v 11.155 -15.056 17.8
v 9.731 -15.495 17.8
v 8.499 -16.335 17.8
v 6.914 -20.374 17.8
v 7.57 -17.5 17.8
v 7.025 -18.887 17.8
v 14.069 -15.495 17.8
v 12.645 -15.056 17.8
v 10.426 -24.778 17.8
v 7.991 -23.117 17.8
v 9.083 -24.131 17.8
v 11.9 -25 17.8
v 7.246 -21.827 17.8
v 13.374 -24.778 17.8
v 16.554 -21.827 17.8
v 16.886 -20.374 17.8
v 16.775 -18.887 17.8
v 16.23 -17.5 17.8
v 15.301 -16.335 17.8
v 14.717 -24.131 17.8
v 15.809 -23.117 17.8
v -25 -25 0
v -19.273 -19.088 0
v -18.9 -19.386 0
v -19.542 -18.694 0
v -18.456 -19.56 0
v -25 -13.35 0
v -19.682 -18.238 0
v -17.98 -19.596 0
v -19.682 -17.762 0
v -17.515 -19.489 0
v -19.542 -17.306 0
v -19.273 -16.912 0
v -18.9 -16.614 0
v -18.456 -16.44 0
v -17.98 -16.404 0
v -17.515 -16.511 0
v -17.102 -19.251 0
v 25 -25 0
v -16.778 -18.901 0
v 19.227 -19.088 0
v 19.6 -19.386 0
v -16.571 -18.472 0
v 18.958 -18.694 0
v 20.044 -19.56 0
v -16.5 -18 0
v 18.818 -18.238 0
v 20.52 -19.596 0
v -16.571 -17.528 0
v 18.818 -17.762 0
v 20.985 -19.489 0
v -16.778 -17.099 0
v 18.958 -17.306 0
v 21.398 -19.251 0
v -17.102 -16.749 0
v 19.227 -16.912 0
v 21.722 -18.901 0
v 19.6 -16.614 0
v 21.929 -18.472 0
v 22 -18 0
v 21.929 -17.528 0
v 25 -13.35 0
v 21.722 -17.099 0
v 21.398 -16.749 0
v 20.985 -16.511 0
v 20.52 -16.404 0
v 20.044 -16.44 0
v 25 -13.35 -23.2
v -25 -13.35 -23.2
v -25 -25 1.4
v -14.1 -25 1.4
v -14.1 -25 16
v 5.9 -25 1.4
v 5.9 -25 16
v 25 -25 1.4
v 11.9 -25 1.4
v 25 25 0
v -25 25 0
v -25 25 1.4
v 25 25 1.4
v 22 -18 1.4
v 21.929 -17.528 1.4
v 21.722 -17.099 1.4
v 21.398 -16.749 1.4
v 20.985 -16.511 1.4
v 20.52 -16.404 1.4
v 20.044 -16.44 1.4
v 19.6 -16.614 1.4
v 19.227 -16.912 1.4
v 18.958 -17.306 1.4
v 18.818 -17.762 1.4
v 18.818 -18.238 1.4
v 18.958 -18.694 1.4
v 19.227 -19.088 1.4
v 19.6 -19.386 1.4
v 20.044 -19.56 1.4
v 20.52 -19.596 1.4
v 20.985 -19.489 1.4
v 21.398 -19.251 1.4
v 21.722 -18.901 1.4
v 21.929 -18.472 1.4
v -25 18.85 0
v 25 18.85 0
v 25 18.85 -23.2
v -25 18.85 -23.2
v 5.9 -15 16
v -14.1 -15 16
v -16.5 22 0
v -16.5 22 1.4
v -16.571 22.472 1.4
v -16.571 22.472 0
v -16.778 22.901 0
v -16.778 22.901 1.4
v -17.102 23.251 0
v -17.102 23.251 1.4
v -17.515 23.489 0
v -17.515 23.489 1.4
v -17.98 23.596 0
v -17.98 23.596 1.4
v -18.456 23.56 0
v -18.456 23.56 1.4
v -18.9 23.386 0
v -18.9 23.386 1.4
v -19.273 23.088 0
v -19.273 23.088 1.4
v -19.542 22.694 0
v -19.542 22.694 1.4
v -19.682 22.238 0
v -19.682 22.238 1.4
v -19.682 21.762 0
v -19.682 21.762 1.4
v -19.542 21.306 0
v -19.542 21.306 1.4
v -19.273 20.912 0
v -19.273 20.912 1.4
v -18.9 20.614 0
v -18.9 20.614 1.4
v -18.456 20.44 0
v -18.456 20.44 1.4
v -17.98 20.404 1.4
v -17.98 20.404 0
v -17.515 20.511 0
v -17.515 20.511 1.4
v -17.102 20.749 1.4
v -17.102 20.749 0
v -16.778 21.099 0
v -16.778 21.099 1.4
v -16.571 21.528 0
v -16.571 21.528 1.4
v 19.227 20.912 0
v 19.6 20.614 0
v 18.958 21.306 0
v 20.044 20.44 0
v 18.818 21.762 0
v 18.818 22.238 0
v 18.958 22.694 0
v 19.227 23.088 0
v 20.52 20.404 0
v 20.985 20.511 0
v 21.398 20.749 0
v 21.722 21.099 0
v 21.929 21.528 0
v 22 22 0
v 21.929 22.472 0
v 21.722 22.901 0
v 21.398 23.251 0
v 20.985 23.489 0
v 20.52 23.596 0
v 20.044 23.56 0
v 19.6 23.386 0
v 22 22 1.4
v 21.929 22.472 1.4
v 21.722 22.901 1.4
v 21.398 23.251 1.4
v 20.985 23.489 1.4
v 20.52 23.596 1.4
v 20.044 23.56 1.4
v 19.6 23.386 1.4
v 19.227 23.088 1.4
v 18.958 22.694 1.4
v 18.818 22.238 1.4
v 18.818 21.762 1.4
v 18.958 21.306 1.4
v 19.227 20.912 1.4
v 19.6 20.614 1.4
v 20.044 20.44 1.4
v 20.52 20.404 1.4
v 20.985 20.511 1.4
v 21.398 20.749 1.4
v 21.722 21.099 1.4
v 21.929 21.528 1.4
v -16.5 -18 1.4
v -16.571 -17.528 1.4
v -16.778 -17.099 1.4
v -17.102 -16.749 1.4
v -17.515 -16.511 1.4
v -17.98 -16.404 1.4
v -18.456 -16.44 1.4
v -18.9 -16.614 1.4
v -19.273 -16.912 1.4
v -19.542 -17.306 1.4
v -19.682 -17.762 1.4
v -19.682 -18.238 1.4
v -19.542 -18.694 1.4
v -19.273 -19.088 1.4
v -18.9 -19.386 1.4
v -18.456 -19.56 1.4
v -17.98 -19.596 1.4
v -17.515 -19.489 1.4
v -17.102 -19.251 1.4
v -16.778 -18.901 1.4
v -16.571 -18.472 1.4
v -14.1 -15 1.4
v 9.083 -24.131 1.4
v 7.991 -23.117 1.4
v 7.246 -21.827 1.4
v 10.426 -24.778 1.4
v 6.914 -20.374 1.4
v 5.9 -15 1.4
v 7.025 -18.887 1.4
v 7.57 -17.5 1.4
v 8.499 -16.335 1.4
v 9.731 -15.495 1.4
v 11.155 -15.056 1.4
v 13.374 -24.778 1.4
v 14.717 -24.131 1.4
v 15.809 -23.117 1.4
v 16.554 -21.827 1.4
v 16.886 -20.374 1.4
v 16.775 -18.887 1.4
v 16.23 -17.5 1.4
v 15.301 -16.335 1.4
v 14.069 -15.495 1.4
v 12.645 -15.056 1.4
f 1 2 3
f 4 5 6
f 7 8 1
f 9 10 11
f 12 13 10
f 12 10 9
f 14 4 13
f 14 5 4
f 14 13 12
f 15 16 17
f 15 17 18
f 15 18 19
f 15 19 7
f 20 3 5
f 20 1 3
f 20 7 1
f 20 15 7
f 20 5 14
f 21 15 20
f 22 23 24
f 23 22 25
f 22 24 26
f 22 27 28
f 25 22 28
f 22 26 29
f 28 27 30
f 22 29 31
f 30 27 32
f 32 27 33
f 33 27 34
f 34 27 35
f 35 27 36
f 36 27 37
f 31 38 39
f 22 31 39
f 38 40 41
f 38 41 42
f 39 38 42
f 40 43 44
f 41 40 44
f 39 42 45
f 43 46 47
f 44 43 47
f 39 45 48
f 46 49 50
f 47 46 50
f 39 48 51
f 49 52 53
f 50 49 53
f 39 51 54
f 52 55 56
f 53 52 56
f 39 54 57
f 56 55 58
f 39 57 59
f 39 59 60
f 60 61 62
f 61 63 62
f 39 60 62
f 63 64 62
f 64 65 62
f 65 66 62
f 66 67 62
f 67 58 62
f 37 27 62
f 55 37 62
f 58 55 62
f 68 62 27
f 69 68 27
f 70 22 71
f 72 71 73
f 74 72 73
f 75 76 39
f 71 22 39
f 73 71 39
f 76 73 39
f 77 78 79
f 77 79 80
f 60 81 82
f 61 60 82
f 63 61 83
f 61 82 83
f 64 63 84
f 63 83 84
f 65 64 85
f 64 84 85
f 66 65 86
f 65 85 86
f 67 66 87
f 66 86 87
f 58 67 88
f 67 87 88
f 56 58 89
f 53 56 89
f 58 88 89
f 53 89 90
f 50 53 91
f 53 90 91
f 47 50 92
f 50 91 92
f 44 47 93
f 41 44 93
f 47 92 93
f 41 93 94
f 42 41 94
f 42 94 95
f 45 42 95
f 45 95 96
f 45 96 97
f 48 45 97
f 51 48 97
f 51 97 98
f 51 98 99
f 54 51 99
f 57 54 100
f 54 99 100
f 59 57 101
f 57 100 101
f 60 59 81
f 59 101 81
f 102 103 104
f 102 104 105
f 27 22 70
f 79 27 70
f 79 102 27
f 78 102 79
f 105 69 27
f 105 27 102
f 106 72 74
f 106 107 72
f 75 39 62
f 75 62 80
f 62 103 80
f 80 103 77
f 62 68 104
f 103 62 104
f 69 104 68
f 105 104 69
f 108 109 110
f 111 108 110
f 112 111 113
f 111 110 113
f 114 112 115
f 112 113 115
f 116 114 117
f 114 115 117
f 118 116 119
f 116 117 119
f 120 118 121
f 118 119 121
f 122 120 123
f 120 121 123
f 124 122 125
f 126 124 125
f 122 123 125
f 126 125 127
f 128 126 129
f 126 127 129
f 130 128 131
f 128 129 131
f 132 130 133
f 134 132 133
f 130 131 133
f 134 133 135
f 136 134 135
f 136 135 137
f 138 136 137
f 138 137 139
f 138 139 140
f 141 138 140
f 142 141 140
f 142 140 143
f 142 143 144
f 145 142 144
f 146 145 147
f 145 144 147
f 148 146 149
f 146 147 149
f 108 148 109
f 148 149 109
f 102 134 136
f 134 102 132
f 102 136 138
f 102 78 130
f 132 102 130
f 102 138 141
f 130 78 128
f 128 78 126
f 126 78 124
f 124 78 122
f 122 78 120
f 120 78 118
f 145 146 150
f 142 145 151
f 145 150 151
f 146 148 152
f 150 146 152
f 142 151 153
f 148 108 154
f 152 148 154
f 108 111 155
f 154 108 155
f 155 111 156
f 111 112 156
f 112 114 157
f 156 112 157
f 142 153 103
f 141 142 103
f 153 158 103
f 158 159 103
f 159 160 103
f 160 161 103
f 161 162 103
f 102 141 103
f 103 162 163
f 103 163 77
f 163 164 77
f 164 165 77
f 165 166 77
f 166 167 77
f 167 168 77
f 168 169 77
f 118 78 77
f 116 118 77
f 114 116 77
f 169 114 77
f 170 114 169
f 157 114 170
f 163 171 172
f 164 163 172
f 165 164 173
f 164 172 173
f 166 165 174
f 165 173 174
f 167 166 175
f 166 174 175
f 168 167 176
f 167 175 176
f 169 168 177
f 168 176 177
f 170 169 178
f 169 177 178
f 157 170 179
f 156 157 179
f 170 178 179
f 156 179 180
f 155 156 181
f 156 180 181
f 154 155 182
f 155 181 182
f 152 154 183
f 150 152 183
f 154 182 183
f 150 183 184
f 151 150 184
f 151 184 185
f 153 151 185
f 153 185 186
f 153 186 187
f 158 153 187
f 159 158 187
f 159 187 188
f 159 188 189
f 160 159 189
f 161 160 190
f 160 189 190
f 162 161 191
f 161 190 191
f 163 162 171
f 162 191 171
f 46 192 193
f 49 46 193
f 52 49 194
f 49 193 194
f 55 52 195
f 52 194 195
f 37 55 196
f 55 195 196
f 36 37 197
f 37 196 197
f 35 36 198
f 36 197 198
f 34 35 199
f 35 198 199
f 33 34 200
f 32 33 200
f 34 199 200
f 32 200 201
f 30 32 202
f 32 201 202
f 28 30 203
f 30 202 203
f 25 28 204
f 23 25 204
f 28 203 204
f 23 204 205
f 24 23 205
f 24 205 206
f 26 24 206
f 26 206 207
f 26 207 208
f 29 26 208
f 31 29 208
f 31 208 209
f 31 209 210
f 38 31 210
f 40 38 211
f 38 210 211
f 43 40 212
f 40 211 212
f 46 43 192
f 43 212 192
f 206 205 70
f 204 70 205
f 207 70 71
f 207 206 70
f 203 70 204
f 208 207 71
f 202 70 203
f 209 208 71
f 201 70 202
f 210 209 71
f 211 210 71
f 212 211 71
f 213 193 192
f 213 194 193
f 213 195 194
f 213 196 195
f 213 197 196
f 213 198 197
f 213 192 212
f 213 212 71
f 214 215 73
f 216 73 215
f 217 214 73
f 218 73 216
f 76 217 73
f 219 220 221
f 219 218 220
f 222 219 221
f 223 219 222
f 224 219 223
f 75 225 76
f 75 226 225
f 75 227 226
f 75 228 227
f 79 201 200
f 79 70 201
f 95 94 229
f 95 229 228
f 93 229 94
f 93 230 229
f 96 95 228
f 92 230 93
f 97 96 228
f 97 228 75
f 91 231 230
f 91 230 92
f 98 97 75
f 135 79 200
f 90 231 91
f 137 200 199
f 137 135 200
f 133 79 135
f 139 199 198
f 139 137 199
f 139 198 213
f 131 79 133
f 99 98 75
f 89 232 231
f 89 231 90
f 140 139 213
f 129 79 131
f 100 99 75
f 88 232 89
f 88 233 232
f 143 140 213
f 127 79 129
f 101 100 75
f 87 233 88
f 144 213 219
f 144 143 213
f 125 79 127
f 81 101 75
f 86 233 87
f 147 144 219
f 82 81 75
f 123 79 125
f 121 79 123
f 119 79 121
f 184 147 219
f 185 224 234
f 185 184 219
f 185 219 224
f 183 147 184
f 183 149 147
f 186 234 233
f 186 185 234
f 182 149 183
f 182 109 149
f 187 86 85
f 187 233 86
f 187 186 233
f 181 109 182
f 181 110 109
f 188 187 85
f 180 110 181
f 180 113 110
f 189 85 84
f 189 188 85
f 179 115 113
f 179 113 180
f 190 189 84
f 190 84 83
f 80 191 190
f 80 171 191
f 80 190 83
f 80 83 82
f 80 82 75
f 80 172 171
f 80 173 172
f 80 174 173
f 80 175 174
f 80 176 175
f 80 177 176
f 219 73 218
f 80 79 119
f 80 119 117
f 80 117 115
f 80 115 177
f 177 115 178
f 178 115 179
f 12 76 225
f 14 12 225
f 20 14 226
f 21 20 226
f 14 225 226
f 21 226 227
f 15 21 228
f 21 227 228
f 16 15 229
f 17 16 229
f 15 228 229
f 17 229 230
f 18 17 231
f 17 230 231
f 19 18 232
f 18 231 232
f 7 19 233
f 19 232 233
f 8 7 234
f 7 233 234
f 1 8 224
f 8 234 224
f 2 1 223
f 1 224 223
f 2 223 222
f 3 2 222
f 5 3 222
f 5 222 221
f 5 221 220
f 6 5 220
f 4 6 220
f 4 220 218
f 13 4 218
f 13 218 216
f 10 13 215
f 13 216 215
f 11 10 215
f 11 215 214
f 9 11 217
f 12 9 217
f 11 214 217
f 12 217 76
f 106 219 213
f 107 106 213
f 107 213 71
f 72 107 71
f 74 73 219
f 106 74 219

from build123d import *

# Parameters (mm, degrees)
CROQUIS2_W              = 50
CROQUIS2_H              = 50
SALIENTE_EXTRUIR1_DEPTH = 1.4
CROQUIS3_R              = 1.6
CORTAR_EXTRUIR1_DEPTH   = 1.4
CROQUIS4_W              = 50
CROQUIS4_H              = 32.2
SALIENTE_EXTRUIR2_DEPTH = 23.2
SALIENTE_EXTRUIR3_DEPTH = 14.6
CROQUIS6_R              = 5
SALIENTE_EXTRUIR4_DEPTH = 16.4


with BuildPart() as part:
    # Croquis2 → Saliente-Extruir1 (new body)
    with BuildSketch(Plane.XY):
        Rectangle(CROQUIS2_W, CROQUIS2_H)
    extrude(amount=SALIENTE_EXTRUIR1_DEPTH)

    # Croquis3 → Cortar-Extruir1 (cut)
    with BuildSketch(Plane.XY.offset(1.4)):
        with Locations((20.4, 22)):
            Circle(CROQUIS3_R)
        with Locations((20.4, -18)):
            Circle(CROQUIS3_R)
        with Locations((-18.1, 22)):
            Circle(CROQUIS3_R)
        with Locations((-18.1, -18)):
            Circle(CROQUIS3_R)
    extrude(amount=-CORTAR_EXTRUIR1_DEPTH, mode=Mode.SUBTRACT)

    # Croquis4 → Saliente-Extruir2 (add)
    with BuildSketch(Plane(origin=(0, 0, 0), x_dir=(-1, 0, 0), z_dir=(0, 0, -1))):
        with Locations((0, 2.75)):
            Rectangle(CROQUIS4_W, CROQUIS4_H)
    extrude(amount=SALIENTE_EXTRUIR2_DEPTH)

    # Croquis5 → Saliente-Extruir3 (add)
    with BuildSketch(Plane.XY.offset(1.4)):
        Polygon((-14.1, -18), (-14.1, -25), (5.9, -25), (5.9, -15), (-14.1, -15), align=None)
    extrude(amount=SALIENTE_EXTRUIR3_DEPTH)

    # Croquis6 → Saliente-Extruir4 (add)
    with BuildSketch(Plane.XY.offset(1.4)):
        with Locations(Location((11.9, -20, 0), (0, 0, 270))):
            Circle(CROQUIS6_R)
    extrude(amount=SALIENTE_EXTRUIR4_DEPTH)


solid = part.part
